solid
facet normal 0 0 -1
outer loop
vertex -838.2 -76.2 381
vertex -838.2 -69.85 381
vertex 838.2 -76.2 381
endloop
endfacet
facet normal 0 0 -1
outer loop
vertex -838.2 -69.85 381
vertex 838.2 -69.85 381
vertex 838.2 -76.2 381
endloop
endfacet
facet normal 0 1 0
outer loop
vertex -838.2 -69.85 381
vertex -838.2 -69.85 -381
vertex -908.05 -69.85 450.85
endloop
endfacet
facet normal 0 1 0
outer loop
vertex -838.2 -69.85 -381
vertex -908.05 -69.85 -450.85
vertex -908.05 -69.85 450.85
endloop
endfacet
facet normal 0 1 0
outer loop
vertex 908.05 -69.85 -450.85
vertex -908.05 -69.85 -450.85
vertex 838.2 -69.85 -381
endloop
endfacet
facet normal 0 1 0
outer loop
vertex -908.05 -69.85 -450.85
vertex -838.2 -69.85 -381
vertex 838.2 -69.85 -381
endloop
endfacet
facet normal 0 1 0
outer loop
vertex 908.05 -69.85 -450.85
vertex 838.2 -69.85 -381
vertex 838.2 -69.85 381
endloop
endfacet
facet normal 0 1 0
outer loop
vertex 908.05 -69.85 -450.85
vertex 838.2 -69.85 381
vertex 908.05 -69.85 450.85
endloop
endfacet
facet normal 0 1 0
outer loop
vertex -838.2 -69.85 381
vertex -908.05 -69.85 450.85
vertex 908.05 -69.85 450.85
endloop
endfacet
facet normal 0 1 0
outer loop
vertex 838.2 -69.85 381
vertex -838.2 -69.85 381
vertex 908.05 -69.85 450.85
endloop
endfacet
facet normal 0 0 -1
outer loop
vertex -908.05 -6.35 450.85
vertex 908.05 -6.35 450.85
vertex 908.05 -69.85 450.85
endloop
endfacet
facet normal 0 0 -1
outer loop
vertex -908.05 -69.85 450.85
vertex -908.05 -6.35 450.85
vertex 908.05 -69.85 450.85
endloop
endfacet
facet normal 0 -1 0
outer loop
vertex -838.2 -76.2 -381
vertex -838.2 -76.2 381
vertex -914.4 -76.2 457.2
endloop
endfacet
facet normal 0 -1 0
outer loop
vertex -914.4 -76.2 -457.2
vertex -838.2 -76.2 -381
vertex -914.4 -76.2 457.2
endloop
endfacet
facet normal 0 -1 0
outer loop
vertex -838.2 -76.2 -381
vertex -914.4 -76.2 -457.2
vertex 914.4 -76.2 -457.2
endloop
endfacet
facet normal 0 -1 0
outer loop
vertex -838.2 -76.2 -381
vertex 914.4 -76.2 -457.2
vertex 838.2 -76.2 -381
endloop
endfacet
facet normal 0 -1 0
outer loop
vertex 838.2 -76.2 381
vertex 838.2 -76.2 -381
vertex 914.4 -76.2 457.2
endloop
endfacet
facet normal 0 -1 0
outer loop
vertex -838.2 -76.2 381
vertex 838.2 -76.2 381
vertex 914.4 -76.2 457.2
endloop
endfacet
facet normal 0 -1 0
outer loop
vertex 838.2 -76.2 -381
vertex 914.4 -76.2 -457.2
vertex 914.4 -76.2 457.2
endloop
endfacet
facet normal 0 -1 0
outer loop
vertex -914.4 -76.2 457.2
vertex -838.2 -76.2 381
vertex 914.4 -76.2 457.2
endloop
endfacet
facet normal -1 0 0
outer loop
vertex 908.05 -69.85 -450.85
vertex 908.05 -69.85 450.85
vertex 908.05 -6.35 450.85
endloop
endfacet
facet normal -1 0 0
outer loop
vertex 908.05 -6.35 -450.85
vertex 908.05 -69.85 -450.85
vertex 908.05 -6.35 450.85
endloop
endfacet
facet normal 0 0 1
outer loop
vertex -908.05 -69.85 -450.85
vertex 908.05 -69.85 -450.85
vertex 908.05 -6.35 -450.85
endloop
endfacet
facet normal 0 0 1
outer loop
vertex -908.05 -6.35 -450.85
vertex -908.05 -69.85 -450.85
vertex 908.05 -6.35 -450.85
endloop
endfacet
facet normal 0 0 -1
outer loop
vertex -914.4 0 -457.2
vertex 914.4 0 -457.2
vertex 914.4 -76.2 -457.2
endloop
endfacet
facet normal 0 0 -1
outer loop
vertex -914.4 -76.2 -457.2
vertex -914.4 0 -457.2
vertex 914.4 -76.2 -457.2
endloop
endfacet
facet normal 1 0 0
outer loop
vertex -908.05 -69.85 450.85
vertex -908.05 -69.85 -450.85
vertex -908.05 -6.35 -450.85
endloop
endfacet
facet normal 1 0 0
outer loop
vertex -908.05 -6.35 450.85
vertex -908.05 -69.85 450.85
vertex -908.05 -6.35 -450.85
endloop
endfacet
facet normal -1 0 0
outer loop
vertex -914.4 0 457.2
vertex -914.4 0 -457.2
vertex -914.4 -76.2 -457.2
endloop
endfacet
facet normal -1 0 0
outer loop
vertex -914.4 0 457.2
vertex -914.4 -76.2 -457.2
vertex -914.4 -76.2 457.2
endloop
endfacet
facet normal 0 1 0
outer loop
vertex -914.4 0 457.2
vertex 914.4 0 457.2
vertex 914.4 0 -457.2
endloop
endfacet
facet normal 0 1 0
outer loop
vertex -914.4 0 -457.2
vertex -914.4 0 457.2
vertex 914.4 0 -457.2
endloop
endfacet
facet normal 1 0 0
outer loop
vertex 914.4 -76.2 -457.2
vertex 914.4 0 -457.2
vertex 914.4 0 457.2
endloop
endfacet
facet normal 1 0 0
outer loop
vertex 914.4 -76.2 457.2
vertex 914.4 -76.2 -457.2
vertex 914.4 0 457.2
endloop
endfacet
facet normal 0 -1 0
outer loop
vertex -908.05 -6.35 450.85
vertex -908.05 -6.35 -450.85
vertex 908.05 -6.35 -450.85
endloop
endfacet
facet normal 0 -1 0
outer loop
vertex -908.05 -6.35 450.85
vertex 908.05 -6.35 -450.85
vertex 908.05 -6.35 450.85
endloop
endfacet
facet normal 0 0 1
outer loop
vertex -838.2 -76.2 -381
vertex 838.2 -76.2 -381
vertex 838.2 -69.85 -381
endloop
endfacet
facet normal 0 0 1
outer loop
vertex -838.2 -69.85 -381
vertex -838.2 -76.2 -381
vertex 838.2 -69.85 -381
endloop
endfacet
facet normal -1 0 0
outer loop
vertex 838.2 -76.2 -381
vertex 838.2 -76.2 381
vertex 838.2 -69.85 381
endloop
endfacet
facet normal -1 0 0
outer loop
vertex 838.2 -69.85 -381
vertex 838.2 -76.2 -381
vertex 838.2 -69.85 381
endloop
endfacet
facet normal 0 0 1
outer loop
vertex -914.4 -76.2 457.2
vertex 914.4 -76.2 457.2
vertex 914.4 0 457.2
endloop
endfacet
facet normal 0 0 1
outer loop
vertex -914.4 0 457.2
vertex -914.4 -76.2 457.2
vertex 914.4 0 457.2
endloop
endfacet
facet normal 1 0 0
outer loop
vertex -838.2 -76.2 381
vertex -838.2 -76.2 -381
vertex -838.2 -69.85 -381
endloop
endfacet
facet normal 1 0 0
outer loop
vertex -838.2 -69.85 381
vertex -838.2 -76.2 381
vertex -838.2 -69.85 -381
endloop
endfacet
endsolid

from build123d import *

# Parameters (mm, degrees)
BOSS_EXTRUDE1_DEPTH = 914.4
BOSS_EXTRUDE2_DEPTH = 457.2


with BuildPart() as part:
    # Sketch1 → Boss-Extrude1 (new body, symmetric)
    with BuildSketch(Plane(origin=(0, 0, 0), x_dir=(0, 0, -1), z_dir=(1, 0, 0))):
        Polygon((-457.2, 0), (457.2, 0), (457.2, -76.2), (381, -76.2), (381, -69.85), (450.85, -69.85), (450.85, -6.35), (-450.85, -6.35), (-450.85, -69.85), (-381, -69.85), (-381, -76.2), (-457.2, -76.2), align=None)
    extrude(amount=BOSS_EXTRUDE1_DEPTH, both=True)

    # Sketch2 → Boss-Extrude2 (add, symmetric)
    with BuildSketch(Plane.XY):
        Polygon((-914.4, 0), (-914.4, -76.2), (-838.2, -76.2), (-838.2, -69.85), (-908.05, -69.85), (-908.05, 0), align=None)
        Polygon((908.05, 0), (914.4, 0), (914.4, -76.2), (838.2, -76.2), (838.2, -69.85), (908.05, -69.85), align=None)
    extrude(amount=BOSS_EXTRUDE2_DEPTH, both=True)


solid = part.part
